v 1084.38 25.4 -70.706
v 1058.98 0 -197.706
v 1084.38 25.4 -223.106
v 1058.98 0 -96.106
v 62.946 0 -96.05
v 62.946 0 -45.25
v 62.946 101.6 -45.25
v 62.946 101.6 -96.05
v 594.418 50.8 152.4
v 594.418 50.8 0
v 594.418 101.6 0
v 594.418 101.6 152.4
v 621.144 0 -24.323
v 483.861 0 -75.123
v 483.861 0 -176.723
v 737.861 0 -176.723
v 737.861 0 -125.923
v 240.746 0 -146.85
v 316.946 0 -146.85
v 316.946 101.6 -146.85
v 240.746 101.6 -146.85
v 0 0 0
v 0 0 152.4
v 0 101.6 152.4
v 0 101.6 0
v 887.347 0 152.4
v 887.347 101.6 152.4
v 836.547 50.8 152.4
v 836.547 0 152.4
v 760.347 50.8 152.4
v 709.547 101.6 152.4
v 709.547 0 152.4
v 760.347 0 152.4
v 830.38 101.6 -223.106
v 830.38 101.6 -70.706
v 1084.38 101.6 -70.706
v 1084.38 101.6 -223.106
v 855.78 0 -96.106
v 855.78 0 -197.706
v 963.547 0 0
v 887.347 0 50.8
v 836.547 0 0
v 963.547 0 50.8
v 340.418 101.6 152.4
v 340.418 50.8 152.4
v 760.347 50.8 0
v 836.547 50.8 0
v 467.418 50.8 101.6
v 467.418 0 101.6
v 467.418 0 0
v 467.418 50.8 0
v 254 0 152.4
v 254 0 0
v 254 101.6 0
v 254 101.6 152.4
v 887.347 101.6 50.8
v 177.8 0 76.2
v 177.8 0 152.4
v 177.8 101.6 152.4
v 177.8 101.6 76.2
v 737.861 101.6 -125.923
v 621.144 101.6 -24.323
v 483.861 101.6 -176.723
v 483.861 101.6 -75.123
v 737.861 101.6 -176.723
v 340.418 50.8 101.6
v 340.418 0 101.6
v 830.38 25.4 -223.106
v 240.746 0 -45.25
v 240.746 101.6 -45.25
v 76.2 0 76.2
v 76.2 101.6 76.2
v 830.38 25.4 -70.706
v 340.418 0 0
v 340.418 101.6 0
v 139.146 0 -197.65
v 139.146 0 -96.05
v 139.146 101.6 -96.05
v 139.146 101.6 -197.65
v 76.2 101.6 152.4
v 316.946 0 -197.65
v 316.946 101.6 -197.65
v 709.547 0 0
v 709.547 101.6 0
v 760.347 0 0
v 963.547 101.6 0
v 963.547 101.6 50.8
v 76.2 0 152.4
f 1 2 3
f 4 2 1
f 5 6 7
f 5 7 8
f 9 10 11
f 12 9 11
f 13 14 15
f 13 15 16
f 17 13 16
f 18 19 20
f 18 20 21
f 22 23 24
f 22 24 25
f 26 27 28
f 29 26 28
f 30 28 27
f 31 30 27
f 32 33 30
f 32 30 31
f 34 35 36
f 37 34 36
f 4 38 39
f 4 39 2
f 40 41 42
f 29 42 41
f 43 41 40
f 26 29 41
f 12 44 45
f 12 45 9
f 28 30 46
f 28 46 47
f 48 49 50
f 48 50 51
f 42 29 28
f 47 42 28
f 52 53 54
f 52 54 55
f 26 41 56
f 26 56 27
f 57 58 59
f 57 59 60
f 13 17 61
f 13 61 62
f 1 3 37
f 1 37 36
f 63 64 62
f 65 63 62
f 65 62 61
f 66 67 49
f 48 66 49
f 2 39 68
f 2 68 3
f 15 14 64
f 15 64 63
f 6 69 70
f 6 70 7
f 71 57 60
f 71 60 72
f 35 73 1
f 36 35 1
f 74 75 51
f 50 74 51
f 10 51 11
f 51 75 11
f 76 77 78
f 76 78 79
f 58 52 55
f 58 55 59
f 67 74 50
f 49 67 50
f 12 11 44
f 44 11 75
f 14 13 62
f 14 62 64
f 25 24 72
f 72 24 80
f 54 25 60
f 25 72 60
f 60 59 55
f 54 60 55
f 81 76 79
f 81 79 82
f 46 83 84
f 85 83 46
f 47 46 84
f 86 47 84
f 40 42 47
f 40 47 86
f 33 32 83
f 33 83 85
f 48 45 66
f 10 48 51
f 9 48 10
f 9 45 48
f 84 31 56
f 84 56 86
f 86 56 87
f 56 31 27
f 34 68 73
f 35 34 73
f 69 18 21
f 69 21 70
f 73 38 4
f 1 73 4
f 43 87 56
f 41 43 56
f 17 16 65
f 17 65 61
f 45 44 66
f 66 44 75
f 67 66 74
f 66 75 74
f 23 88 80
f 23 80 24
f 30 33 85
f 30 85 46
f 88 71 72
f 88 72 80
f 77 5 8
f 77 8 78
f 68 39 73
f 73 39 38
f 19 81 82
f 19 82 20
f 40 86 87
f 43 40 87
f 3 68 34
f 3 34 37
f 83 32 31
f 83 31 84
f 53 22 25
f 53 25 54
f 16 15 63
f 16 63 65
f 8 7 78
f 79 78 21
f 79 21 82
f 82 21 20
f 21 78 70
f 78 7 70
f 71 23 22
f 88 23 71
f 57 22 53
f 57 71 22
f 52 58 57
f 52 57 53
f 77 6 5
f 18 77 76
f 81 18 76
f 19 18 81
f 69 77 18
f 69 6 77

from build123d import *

# Parameters (mm, degrees)
F1_DEPTH  = 101.6
F3_DEPTH  = 152.4
F4_W      = 127
F4_H      = 50.8
F5_DEPTH  = 50.8
F7_DEPTH  = 101.6
F8_W      = 76.2
F8_H      = 50.8
F9_DEPTH  = 152.4
F11_DEPTH = 101.6
F13_DEPTH = 101.6
F14_W     = 254
F14_H     = 152.4
F15_DEPTH = 101.6
F16_SIZE  = 25.4


with BuildPart() as f1:
    # F0 (on Front) → F1 (new body)
    with BuildSketch(Plane.XZ):
        Polygon((0, 152.4), (0, 0), (254, 0), (254, 152.4), (177.8, 152.4), (177.8, 76.2), (76.2, 76.2), (76.2, 152.4), align=None)
    extrude(amount=-F1_DEPTH)


with BuildPart() as f3:
    # F2 (on Top) → F3 (new body)
    with BuildSketch(Plane.XY):
        Polygon((340.417987, 101.6), (340.417987, 0), (467.417987, 0), (467.417987, 50.8), (594.417987, 50.8), (594.417987, 101.6), align=None)
    extrude(amount=F3_DEPTH)

    # F4 (on face) → F5 (cut)
    with BuildSketch(Plane.XZ):
        with Locations((403.917987, 127)):
            Rectangle(F4_W, F4_H)
    extrude(amount=-F5_DEPTH, mode=Mode.SUBTRACT)


with BuildPart() as f7:
    # F6 (on Front) → F7 (new body)
    with BuildSketch(Plane.XZ):
        Polygon((887.346619, 152.4), (709.546619, 152.4), (709.546619, 0), (963.546619, 0), (963.546619, 50.8), (887.346619, 50.8), align=None)
    extrude(amount=-F7_DEPTH)

    # F8 (on face) → F9 (cut)
    with BuildSketch(Plane.XY.offset(152.4)):
        with Locations((798.446619, 25.4)):
            Rectangle(F8_W, F8_H)
    extrude(amount=-F9_DEPTH, mode=Mode.SUBTRACT)


with BuildPart() as f11:
    # F10 (on Front) → F11 (new body)
    with BuildSketch(Plane.XZ):
        Polygon((240.745873, -45.249616), (62.945873, -45.249616), (62.945873, -96.049616), (139.145873, -96.049616), (139.145873, -197.649616), (316.945873, -197.649616), (316.945873, -146.849616), (240.745873, -146.849616), align=None)
    extrude(amount=-F11_DEPTH)


with BuildPart() as f13:
    # F12 (on Front) → F13 (new body)
    with BuildSketch(Plane.XZ):
        Polygon((483.86136, -75.123226), (483.86136, -176.723226), (737.86136, -176.723226), (737.86136, -125.923226), (621.143999, -24.323226), align=None)
    extrude(amount=-F13_DEPTH)


with BuildPart() as f15:
    # F14 (on Front) → F15 (new body)
    with BuildSketch(Plane.XZ):
        with Locations((957.380065, -146.905967)):
            Rectangle(F14_W, F14_H)
    extrude(amount=-F15_DEPTH)

    # F16
    f16_edges = [f15.edges().sort_by_distance(p)[0] for p in [
        (957.380065, 0, -70.705967),
        (830.380065, 0, -146.905967),
        (957.380065, 0, -223.105967),
        (1084.380065, 0, -146.905967),
    ]]
    chamfer(f16_edges, length=F16_SIZE)


solid = Compound([f1.part, f3.part, f7.part, f11.part, f13.part, f15.part])
